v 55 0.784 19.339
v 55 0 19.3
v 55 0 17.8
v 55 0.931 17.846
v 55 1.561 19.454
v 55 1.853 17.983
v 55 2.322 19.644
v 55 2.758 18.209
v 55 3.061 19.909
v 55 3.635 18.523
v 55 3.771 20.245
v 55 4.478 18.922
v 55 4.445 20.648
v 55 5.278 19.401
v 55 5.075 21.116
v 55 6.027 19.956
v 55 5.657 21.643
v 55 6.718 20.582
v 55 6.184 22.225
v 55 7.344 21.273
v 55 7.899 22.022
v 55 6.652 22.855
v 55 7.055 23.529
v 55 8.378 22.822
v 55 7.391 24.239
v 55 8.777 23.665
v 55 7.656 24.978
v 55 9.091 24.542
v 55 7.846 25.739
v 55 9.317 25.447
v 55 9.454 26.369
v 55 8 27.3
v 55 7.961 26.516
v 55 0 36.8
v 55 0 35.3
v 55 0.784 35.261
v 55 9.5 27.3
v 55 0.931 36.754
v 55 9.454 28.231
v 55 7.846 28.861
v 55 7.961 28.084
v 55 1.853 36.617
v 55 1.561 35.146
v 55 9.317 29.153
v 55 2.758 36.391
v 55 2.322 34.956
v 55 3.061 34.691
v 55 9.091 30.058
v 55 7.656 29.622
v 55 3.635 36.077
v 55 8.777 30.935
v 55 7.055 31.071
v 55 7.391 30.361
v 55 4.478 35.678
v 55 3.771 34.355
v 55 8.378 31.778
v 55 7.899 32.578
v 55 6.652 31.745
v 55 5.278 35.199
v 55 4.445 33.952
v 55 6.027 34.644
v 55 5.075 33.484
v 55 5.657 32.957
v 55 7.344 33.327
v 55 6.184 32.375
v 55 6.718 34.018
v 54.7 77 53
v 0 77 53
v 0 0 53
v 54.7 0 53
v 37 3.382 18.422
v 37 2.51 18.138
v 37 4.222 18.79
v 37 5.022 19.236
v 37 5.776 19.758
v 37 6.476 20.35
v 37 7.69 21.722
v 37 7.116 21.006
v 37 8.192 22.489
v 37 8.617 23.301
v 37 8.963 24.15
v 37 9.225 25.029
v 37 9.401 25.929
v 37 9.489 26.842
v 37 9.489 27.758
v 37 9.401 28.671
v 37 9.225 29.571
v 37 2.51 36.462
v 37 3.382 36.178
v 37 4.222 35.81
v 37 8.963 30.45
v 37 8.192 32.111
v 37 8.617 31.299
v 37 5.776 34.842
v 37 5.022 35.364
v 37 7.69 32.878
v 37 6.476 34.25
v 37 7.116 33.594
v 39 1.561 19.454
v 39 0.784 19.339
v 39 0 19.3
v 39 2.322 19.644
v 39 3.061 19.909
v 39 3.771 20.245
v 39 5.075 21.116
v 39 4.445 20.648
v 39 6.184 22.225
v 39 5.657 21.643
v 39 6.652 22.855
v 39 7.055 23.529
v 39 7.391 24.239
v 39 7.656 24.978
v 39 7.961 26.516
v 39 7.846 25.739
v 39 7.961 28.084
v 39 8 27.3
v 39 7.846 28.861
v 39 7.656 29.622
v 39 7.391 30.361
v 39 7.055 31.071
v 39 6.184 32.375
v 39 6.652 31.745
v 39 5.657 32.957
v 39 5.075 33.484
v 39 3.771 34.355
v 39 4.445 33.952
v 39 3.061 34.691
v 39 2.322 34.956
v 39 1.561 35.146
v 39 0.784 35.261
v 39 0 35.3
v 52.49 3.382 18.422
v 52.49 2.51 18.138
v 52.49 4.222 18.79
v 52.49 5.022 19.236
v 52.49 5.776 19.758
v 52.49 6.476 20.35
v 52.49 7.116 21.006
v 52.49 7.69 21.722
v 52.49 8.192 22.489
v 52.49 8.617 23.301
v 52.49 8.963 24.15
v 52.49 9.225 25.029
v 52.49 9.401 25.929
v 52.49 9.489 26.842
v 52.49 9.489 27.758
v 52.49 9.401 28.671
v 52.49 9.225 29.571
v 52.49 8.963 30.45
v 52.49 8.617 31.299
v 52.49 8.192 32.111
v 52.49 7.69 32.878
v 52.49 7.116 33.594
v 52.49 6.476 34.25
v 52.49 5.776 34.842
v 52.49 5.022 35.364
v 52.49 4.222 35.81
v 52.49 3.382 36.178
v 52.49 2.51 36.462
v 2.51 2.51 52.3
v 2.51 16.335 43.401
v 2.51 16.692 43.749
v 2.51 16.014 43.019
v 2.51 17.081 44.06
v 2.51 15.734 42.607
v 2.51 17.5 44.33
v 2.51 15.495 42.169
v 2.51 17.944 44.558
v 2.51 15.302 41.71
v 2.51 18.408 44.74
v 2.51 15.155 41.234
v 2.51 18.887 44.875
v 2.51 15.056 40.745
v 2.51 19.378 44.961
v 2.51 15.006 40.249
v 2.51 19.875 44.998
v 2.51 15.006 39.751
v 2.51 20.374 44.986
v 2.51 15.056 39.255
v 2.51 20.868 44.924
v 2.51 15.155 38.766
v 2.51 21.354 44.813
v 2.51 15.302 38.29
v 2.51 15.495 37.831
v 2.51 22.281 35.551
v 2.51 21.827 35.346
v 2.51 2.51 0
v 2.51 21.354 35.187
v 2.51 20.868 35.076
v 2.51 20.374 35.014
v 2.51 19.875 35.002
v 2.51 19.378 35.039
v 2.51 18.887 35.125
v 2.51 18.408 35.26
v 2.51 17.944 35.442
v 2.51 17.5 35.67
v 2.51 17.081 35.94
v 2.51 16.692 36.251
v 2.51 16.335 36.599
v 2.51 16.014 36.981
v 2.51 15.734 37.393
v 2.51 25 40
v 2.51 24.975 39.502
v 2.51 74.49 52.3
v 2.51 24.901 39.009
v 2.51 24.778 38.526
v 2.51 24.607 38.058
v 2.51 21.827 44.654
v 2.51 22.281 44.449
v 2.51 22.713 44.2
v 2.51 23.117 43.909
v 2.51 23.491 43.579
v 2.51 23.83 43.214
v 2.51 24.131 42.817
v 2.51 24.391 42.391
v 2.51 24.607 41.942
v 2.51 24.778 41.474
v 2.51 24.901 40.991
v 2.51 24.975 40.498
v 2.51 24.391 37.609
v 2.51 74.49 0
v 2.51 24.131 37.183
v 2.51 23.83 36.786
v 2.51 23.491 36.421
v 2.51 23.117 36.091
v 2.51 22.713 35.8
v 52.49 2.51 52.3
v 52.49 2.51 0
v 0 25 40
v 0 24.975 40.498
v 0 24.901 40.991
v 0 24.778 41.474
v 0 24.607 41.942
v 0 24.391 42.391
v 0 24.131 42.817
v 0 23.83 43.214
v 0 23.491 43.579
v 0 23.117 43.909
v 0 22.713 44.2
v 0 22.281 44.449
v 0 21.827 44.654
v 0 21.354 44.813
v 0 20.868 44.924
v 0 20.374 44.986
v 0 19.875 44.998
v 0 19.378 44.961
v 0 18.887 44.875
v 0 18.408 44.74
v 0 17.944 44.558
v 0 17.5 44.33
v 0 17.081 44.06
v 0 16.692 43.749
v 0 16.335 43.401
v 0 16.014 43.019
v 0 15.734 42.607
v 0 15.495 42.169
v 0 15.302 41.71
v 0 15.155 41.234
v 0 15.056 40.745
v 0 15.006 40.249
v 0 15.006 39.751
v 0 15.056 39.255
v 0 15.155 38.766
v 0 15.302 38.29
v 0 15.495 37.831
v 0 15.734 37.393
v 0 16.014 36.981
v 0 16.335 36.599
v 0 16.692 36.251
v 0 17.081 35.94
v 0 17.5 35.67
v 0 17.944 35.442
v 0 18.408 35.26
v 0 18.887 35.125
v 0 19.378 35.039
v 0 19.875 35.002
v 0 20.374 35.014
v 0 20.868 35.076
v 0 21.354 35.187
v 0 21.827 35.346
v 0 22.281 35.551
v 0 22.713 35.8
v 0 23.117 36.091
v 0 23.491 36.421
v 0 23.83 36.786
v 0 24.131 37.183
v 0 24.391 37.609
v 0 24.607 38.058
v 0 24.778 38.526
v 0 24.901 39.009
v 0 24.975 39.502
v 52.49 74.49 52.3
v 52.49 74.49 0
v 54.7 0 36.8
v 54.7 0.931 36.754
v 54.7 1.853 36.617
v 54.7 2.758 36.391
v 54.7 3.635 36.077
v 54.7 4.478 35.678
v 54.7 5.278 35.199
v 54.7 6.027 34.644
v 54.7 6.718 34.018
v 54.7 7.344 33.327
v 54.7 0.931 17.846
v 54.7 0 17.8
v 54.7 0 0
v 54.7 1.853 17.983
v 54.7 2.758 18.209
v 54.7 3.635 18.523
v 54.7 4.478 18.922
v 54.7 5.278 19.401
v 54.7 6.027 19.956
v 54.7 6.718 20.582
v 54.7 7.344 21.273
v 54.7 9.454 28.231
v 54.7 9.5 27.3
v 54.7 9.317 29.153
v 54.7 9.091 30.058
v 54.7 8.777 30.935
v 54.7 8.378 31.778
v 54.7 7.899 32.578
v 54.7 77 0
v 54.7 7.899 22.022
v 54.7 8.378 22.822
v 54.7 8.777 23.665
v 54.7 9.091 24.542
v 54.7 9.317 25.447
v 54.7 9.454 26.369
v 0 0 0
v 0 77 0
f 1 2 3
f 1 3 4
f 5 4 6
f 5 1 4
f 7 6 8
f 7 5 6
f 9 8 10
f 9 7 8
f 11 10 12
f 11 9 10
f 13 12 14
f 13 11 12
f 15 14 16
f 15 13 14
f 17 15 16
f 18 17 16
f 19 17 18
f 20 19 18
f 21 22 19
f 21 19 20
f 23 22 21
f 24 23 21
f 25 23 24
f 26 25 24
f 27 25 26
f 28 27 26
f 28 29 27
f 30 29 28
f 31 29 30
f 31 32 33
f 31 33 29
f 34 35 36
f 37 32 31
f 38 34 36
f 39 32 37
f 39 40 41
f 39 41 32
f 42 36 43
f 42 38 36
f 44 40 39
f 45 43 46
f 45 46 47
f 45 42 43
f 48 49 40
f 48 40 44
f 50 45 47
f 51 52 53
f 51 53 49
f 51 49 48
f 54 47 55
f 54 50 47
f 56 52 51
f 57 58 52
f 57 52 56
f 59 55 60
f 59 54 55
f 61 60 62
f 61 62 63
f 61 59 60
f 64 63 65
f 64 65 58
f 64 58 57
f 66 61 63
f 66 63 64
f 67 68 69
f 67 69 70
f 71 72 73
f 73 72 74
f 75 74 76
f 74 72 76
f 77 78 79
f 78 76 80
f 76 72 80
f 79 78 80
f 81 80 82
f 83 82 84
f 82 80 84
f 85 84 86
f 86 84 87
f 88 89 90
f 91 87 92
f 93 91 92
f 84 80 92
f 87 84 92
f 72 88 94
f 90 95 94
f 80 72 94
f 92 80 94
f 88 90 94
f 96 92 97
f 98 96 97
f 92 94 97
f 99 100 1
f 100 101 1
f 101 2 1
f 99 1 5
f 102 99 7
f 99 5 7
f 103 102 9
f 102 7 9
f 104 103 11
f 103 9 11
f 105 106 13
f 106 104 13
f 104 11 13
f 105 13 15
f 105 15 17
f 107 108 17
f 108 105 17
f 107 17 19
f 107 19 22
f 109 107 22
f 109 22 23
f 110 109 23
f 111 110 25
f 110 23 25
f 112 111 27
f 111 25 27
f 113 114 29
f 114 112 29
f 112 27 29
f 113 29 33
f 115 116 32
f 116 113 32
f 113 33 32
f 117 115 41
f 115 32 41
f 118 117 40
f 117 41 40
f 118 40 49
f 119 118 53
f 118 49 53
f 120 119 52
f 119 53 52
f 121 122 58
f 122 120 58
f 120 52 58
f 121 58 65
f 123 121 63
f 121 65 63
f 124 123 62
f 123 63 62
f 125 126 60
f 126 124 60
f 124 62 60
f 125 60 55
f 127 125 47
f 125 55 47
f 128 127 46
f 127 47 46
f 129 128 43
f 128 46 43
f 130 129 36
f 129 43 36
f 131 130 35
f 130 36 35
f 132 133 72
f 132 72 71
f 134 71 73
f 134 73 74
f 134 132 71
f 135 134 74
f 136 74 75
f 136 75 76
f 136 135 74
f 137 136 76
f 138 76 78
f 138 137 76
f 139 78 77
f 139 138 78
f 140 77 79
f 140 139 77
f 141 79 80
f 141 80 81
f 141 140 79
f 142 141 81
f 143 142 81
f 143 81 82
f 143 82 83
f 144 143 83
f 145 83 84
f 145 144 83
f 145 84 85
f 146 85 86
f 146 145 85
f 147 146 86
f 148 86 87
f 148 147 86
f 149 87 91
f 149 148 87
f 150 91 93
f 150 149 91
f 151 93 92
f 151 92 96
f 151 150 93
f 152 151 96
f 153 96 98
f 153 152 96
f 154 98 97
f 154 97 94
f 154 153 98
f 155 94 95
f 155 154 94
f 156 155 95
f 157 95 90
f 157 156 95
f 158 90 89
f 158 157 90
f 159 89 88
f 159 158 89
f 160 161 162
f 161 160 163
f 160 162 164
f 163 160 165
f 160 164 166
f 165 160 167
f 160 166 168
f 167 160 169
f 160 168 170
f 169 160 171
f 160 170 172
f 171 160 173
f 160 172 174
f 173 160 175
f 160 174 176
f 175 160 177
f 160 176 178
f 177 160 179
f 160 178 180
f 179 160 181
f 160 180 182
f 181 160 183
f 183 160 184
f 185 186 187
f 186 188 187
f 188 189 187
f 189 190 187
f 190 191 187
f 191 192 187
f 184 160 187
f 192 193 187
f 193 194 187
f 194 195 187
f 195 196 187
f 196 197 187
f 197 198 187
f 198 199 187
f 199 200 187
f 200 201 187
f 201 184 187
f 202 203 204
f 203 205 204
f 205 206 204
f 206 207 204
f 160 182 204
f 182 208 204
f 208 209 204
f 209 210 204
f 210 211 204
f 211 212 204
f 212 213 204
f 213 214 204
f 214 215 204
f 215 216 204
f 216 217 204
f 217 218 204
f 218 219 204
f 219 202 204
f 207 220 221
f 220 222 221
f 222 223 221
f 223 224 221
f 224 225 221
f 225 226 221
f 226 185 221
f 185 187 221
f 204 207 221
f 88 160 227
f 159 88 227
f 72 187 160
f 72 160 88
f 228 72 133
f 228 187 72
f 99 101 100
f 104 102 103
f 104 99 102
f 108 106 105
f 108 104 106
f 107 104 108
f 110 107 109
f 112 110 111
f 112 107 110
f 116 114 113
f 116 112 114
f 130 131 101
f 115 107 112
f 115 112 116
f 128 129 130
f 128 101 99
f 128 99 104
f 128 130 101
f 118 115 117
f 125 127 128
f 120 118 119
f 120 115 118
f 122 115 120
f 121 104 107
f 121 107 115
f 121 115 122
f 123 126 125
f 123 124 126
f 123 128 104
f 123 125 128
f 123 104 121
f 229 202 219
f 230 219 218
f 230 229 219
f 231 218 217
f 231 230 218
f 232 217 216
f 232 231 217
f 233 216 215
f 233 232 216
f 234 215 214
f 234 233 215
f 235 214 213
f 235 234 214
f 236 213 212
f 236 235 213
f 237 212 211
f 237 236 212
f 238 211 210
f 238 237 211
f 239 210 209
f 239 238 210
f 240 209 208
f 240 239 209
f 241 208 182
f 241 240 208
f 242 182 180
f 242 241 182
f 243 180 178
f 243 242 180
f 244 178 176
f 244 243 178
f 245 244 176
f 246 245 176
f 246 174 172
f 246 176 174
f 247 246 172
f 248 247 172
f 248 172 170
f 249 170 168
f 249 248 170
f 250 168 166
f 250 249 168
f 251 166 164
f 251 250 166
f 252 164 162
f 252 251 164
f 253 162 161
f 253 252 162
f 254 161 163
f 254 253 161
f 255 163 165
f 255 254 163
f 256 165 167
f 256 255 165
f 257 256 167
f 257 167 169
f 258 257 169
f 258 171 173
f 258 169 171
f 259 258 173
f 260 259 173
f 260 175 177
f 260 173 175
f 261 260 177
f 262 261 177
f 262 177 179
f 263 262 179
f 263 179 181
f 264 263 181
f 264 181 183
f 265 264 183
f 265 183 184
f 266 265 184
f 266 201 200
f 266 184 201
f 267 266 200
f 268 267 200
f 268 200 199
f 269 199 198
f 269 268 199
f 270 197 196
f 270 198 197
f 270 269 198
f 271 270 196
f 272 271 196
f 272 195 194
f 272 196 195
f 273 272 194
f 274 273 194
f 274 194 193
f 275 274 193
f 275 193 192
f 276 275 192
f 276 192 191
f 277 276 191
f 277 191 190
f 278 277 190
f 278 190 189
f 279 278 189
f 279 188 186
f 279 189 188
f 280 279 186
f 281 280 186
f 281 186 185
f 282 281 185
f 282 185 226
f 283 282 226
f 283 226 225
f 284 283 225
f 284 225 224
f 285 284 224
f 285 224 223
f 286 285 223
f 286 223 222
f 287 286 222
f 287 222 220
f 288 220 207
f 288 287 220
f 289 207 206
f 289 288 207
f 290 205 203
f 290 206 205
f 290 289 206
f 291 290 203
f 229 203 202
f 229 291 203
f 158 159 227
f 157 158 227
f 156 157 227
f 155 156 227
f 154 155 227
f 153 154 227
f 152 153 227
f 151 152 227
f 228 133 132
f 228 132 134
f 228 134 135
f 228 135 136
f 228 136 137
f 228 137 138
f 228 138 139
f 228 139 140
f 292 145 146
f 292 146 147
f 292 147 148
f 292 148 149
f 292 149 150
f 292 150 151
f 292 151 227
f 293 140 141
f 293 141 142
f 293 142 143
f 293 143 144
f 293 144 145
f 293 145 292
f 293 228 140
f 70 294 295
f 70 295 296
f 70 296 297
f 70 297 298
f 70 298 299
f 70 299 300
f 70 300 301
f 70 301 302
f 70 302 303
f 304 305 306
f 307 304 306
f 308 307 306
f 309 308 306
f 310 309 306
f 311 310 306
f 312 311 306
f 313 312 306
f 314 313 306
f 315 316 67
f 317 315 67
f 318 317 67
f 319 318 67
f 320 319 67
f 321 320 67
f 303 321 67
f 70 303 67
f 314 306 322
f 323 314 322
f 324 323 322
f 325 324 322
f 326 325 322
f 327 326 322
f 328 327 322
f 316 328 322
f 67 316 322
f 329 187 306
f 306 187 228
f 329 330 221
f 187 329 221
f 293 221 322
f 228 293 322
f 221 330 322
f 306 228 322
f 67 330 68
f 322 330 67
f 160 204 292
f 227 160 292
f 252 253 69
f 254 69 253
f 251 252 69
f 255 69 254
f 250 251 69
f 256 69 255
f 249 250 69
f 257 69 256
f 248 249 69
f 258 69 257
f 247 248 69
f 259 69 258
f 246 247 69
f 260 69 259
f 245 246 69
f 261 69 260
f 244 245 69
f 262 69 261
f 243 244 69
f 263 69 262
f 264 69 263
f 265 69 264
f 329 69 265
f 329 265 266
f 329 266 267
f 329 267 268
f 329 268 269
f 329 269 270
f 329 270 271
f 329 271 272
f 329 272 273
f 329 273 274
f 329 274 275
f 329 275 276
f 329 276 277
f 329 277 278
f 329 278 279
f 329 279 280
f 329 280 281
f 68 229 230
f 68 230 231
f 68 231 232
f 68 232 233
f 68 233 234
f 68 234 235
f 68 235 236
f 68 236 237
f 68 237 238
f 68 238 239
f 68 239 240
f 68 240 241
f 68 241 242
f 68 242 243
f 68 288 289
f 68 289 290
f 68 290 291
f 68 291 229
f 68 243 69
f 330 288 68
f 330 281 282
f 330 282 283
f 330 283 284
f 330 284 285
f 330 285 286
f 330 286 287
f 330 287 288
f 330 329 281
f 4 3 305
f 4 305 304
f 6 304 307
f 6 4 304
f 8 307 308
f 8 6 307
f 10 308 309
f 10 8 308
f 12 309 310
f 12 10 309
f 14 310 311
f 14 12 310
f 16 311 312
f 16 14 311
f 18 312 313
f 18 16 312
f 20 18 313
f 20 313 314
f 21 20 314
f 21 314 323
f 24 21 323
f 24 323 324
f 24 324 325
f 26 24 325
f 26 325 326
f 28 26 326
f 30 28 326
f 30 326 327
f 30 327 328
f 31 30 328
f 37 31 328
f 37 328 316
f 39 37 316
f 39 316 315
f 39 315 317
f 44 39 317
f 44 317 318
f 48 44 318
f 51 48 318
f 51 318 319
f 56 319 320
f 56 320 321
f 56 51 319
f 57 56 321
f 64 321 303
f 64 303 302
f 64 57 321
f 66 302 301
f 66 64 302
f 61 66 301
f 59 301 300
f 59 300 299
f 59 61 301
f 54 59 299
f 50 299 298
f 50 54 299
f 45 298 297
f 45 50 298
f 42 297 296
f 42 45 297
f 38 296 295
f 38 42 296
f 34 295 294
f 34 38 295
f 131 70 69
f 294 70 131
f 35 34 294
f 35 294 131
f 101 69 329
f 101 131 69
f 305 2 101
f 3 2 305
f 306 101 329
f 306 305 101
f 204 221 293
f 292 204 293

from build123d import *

# Parameters (mm, degrees)
SKETCH_W        = 54.7
SKETCH_H        = 77
PAD_DEPTH       = 53
SKETCH001_W     = 49.98
SKETCH001_H     = 71.98
POCKET_DEPTH    = 52.3
SKETCH002_R     = 5
POCKET001_DEPTH = 5
PAD001_DEPTH    = 18
SKETCH003_R     = 8
POCKET002_DEPTH = 16


with BuildPart() as part:
    # Sketch → Pad (new body)
    with BuildSketch(Plane.XY):
        with Locations((27.35, 38.5)):
            Rectangle(SKETCH_W, SKETCH_H)
    extrude(amount=PAD_DEPTH)

    # Sketch001 → Pocket (cut)
    with BuildSketch(Plane.XY):
        with Locations((27.5, 38.5)):
            Rectangle(SKETCH001_W, SKETCH001_H)
    extrude(amount=POCKET_DEPTH, mode=Mode.SUBTRACT)

    # Sketch002 → Pocket001 (cut)
    with BuildSketch(Plane.YZ):
        with Locations((20, 40)):
            Circle(SKETCH002_R)
    extrude(amount=POCKET001_DEPTH, mode=Mode.SUBTRACT)

    # Sketch004 (on DatumPlane) → Pad001 (join)
    with BuildSketch(Plane.YZ.offset(55)):
        with BuildLine():
            ThreePointArc((0, 17.8), (9.5, 27.3), (0, 36.8))
            Line((0, 36.8), (0, 17.8))
        make_face()
    extrude(amount=-PAD001_DEPTH)

    # Sketch003 (on DatumPlane) → Pocket002 (cut, symmetric)
    with BuildSketch(Plane.YZ.offset(55)):
        with Locations((0, 27.3)):
            Circle(SKETCH003_R)
    extrude(amount=POCKET002_DEPTH, both=True, mode=Mode.SUBTRACT)


solid = part.part
